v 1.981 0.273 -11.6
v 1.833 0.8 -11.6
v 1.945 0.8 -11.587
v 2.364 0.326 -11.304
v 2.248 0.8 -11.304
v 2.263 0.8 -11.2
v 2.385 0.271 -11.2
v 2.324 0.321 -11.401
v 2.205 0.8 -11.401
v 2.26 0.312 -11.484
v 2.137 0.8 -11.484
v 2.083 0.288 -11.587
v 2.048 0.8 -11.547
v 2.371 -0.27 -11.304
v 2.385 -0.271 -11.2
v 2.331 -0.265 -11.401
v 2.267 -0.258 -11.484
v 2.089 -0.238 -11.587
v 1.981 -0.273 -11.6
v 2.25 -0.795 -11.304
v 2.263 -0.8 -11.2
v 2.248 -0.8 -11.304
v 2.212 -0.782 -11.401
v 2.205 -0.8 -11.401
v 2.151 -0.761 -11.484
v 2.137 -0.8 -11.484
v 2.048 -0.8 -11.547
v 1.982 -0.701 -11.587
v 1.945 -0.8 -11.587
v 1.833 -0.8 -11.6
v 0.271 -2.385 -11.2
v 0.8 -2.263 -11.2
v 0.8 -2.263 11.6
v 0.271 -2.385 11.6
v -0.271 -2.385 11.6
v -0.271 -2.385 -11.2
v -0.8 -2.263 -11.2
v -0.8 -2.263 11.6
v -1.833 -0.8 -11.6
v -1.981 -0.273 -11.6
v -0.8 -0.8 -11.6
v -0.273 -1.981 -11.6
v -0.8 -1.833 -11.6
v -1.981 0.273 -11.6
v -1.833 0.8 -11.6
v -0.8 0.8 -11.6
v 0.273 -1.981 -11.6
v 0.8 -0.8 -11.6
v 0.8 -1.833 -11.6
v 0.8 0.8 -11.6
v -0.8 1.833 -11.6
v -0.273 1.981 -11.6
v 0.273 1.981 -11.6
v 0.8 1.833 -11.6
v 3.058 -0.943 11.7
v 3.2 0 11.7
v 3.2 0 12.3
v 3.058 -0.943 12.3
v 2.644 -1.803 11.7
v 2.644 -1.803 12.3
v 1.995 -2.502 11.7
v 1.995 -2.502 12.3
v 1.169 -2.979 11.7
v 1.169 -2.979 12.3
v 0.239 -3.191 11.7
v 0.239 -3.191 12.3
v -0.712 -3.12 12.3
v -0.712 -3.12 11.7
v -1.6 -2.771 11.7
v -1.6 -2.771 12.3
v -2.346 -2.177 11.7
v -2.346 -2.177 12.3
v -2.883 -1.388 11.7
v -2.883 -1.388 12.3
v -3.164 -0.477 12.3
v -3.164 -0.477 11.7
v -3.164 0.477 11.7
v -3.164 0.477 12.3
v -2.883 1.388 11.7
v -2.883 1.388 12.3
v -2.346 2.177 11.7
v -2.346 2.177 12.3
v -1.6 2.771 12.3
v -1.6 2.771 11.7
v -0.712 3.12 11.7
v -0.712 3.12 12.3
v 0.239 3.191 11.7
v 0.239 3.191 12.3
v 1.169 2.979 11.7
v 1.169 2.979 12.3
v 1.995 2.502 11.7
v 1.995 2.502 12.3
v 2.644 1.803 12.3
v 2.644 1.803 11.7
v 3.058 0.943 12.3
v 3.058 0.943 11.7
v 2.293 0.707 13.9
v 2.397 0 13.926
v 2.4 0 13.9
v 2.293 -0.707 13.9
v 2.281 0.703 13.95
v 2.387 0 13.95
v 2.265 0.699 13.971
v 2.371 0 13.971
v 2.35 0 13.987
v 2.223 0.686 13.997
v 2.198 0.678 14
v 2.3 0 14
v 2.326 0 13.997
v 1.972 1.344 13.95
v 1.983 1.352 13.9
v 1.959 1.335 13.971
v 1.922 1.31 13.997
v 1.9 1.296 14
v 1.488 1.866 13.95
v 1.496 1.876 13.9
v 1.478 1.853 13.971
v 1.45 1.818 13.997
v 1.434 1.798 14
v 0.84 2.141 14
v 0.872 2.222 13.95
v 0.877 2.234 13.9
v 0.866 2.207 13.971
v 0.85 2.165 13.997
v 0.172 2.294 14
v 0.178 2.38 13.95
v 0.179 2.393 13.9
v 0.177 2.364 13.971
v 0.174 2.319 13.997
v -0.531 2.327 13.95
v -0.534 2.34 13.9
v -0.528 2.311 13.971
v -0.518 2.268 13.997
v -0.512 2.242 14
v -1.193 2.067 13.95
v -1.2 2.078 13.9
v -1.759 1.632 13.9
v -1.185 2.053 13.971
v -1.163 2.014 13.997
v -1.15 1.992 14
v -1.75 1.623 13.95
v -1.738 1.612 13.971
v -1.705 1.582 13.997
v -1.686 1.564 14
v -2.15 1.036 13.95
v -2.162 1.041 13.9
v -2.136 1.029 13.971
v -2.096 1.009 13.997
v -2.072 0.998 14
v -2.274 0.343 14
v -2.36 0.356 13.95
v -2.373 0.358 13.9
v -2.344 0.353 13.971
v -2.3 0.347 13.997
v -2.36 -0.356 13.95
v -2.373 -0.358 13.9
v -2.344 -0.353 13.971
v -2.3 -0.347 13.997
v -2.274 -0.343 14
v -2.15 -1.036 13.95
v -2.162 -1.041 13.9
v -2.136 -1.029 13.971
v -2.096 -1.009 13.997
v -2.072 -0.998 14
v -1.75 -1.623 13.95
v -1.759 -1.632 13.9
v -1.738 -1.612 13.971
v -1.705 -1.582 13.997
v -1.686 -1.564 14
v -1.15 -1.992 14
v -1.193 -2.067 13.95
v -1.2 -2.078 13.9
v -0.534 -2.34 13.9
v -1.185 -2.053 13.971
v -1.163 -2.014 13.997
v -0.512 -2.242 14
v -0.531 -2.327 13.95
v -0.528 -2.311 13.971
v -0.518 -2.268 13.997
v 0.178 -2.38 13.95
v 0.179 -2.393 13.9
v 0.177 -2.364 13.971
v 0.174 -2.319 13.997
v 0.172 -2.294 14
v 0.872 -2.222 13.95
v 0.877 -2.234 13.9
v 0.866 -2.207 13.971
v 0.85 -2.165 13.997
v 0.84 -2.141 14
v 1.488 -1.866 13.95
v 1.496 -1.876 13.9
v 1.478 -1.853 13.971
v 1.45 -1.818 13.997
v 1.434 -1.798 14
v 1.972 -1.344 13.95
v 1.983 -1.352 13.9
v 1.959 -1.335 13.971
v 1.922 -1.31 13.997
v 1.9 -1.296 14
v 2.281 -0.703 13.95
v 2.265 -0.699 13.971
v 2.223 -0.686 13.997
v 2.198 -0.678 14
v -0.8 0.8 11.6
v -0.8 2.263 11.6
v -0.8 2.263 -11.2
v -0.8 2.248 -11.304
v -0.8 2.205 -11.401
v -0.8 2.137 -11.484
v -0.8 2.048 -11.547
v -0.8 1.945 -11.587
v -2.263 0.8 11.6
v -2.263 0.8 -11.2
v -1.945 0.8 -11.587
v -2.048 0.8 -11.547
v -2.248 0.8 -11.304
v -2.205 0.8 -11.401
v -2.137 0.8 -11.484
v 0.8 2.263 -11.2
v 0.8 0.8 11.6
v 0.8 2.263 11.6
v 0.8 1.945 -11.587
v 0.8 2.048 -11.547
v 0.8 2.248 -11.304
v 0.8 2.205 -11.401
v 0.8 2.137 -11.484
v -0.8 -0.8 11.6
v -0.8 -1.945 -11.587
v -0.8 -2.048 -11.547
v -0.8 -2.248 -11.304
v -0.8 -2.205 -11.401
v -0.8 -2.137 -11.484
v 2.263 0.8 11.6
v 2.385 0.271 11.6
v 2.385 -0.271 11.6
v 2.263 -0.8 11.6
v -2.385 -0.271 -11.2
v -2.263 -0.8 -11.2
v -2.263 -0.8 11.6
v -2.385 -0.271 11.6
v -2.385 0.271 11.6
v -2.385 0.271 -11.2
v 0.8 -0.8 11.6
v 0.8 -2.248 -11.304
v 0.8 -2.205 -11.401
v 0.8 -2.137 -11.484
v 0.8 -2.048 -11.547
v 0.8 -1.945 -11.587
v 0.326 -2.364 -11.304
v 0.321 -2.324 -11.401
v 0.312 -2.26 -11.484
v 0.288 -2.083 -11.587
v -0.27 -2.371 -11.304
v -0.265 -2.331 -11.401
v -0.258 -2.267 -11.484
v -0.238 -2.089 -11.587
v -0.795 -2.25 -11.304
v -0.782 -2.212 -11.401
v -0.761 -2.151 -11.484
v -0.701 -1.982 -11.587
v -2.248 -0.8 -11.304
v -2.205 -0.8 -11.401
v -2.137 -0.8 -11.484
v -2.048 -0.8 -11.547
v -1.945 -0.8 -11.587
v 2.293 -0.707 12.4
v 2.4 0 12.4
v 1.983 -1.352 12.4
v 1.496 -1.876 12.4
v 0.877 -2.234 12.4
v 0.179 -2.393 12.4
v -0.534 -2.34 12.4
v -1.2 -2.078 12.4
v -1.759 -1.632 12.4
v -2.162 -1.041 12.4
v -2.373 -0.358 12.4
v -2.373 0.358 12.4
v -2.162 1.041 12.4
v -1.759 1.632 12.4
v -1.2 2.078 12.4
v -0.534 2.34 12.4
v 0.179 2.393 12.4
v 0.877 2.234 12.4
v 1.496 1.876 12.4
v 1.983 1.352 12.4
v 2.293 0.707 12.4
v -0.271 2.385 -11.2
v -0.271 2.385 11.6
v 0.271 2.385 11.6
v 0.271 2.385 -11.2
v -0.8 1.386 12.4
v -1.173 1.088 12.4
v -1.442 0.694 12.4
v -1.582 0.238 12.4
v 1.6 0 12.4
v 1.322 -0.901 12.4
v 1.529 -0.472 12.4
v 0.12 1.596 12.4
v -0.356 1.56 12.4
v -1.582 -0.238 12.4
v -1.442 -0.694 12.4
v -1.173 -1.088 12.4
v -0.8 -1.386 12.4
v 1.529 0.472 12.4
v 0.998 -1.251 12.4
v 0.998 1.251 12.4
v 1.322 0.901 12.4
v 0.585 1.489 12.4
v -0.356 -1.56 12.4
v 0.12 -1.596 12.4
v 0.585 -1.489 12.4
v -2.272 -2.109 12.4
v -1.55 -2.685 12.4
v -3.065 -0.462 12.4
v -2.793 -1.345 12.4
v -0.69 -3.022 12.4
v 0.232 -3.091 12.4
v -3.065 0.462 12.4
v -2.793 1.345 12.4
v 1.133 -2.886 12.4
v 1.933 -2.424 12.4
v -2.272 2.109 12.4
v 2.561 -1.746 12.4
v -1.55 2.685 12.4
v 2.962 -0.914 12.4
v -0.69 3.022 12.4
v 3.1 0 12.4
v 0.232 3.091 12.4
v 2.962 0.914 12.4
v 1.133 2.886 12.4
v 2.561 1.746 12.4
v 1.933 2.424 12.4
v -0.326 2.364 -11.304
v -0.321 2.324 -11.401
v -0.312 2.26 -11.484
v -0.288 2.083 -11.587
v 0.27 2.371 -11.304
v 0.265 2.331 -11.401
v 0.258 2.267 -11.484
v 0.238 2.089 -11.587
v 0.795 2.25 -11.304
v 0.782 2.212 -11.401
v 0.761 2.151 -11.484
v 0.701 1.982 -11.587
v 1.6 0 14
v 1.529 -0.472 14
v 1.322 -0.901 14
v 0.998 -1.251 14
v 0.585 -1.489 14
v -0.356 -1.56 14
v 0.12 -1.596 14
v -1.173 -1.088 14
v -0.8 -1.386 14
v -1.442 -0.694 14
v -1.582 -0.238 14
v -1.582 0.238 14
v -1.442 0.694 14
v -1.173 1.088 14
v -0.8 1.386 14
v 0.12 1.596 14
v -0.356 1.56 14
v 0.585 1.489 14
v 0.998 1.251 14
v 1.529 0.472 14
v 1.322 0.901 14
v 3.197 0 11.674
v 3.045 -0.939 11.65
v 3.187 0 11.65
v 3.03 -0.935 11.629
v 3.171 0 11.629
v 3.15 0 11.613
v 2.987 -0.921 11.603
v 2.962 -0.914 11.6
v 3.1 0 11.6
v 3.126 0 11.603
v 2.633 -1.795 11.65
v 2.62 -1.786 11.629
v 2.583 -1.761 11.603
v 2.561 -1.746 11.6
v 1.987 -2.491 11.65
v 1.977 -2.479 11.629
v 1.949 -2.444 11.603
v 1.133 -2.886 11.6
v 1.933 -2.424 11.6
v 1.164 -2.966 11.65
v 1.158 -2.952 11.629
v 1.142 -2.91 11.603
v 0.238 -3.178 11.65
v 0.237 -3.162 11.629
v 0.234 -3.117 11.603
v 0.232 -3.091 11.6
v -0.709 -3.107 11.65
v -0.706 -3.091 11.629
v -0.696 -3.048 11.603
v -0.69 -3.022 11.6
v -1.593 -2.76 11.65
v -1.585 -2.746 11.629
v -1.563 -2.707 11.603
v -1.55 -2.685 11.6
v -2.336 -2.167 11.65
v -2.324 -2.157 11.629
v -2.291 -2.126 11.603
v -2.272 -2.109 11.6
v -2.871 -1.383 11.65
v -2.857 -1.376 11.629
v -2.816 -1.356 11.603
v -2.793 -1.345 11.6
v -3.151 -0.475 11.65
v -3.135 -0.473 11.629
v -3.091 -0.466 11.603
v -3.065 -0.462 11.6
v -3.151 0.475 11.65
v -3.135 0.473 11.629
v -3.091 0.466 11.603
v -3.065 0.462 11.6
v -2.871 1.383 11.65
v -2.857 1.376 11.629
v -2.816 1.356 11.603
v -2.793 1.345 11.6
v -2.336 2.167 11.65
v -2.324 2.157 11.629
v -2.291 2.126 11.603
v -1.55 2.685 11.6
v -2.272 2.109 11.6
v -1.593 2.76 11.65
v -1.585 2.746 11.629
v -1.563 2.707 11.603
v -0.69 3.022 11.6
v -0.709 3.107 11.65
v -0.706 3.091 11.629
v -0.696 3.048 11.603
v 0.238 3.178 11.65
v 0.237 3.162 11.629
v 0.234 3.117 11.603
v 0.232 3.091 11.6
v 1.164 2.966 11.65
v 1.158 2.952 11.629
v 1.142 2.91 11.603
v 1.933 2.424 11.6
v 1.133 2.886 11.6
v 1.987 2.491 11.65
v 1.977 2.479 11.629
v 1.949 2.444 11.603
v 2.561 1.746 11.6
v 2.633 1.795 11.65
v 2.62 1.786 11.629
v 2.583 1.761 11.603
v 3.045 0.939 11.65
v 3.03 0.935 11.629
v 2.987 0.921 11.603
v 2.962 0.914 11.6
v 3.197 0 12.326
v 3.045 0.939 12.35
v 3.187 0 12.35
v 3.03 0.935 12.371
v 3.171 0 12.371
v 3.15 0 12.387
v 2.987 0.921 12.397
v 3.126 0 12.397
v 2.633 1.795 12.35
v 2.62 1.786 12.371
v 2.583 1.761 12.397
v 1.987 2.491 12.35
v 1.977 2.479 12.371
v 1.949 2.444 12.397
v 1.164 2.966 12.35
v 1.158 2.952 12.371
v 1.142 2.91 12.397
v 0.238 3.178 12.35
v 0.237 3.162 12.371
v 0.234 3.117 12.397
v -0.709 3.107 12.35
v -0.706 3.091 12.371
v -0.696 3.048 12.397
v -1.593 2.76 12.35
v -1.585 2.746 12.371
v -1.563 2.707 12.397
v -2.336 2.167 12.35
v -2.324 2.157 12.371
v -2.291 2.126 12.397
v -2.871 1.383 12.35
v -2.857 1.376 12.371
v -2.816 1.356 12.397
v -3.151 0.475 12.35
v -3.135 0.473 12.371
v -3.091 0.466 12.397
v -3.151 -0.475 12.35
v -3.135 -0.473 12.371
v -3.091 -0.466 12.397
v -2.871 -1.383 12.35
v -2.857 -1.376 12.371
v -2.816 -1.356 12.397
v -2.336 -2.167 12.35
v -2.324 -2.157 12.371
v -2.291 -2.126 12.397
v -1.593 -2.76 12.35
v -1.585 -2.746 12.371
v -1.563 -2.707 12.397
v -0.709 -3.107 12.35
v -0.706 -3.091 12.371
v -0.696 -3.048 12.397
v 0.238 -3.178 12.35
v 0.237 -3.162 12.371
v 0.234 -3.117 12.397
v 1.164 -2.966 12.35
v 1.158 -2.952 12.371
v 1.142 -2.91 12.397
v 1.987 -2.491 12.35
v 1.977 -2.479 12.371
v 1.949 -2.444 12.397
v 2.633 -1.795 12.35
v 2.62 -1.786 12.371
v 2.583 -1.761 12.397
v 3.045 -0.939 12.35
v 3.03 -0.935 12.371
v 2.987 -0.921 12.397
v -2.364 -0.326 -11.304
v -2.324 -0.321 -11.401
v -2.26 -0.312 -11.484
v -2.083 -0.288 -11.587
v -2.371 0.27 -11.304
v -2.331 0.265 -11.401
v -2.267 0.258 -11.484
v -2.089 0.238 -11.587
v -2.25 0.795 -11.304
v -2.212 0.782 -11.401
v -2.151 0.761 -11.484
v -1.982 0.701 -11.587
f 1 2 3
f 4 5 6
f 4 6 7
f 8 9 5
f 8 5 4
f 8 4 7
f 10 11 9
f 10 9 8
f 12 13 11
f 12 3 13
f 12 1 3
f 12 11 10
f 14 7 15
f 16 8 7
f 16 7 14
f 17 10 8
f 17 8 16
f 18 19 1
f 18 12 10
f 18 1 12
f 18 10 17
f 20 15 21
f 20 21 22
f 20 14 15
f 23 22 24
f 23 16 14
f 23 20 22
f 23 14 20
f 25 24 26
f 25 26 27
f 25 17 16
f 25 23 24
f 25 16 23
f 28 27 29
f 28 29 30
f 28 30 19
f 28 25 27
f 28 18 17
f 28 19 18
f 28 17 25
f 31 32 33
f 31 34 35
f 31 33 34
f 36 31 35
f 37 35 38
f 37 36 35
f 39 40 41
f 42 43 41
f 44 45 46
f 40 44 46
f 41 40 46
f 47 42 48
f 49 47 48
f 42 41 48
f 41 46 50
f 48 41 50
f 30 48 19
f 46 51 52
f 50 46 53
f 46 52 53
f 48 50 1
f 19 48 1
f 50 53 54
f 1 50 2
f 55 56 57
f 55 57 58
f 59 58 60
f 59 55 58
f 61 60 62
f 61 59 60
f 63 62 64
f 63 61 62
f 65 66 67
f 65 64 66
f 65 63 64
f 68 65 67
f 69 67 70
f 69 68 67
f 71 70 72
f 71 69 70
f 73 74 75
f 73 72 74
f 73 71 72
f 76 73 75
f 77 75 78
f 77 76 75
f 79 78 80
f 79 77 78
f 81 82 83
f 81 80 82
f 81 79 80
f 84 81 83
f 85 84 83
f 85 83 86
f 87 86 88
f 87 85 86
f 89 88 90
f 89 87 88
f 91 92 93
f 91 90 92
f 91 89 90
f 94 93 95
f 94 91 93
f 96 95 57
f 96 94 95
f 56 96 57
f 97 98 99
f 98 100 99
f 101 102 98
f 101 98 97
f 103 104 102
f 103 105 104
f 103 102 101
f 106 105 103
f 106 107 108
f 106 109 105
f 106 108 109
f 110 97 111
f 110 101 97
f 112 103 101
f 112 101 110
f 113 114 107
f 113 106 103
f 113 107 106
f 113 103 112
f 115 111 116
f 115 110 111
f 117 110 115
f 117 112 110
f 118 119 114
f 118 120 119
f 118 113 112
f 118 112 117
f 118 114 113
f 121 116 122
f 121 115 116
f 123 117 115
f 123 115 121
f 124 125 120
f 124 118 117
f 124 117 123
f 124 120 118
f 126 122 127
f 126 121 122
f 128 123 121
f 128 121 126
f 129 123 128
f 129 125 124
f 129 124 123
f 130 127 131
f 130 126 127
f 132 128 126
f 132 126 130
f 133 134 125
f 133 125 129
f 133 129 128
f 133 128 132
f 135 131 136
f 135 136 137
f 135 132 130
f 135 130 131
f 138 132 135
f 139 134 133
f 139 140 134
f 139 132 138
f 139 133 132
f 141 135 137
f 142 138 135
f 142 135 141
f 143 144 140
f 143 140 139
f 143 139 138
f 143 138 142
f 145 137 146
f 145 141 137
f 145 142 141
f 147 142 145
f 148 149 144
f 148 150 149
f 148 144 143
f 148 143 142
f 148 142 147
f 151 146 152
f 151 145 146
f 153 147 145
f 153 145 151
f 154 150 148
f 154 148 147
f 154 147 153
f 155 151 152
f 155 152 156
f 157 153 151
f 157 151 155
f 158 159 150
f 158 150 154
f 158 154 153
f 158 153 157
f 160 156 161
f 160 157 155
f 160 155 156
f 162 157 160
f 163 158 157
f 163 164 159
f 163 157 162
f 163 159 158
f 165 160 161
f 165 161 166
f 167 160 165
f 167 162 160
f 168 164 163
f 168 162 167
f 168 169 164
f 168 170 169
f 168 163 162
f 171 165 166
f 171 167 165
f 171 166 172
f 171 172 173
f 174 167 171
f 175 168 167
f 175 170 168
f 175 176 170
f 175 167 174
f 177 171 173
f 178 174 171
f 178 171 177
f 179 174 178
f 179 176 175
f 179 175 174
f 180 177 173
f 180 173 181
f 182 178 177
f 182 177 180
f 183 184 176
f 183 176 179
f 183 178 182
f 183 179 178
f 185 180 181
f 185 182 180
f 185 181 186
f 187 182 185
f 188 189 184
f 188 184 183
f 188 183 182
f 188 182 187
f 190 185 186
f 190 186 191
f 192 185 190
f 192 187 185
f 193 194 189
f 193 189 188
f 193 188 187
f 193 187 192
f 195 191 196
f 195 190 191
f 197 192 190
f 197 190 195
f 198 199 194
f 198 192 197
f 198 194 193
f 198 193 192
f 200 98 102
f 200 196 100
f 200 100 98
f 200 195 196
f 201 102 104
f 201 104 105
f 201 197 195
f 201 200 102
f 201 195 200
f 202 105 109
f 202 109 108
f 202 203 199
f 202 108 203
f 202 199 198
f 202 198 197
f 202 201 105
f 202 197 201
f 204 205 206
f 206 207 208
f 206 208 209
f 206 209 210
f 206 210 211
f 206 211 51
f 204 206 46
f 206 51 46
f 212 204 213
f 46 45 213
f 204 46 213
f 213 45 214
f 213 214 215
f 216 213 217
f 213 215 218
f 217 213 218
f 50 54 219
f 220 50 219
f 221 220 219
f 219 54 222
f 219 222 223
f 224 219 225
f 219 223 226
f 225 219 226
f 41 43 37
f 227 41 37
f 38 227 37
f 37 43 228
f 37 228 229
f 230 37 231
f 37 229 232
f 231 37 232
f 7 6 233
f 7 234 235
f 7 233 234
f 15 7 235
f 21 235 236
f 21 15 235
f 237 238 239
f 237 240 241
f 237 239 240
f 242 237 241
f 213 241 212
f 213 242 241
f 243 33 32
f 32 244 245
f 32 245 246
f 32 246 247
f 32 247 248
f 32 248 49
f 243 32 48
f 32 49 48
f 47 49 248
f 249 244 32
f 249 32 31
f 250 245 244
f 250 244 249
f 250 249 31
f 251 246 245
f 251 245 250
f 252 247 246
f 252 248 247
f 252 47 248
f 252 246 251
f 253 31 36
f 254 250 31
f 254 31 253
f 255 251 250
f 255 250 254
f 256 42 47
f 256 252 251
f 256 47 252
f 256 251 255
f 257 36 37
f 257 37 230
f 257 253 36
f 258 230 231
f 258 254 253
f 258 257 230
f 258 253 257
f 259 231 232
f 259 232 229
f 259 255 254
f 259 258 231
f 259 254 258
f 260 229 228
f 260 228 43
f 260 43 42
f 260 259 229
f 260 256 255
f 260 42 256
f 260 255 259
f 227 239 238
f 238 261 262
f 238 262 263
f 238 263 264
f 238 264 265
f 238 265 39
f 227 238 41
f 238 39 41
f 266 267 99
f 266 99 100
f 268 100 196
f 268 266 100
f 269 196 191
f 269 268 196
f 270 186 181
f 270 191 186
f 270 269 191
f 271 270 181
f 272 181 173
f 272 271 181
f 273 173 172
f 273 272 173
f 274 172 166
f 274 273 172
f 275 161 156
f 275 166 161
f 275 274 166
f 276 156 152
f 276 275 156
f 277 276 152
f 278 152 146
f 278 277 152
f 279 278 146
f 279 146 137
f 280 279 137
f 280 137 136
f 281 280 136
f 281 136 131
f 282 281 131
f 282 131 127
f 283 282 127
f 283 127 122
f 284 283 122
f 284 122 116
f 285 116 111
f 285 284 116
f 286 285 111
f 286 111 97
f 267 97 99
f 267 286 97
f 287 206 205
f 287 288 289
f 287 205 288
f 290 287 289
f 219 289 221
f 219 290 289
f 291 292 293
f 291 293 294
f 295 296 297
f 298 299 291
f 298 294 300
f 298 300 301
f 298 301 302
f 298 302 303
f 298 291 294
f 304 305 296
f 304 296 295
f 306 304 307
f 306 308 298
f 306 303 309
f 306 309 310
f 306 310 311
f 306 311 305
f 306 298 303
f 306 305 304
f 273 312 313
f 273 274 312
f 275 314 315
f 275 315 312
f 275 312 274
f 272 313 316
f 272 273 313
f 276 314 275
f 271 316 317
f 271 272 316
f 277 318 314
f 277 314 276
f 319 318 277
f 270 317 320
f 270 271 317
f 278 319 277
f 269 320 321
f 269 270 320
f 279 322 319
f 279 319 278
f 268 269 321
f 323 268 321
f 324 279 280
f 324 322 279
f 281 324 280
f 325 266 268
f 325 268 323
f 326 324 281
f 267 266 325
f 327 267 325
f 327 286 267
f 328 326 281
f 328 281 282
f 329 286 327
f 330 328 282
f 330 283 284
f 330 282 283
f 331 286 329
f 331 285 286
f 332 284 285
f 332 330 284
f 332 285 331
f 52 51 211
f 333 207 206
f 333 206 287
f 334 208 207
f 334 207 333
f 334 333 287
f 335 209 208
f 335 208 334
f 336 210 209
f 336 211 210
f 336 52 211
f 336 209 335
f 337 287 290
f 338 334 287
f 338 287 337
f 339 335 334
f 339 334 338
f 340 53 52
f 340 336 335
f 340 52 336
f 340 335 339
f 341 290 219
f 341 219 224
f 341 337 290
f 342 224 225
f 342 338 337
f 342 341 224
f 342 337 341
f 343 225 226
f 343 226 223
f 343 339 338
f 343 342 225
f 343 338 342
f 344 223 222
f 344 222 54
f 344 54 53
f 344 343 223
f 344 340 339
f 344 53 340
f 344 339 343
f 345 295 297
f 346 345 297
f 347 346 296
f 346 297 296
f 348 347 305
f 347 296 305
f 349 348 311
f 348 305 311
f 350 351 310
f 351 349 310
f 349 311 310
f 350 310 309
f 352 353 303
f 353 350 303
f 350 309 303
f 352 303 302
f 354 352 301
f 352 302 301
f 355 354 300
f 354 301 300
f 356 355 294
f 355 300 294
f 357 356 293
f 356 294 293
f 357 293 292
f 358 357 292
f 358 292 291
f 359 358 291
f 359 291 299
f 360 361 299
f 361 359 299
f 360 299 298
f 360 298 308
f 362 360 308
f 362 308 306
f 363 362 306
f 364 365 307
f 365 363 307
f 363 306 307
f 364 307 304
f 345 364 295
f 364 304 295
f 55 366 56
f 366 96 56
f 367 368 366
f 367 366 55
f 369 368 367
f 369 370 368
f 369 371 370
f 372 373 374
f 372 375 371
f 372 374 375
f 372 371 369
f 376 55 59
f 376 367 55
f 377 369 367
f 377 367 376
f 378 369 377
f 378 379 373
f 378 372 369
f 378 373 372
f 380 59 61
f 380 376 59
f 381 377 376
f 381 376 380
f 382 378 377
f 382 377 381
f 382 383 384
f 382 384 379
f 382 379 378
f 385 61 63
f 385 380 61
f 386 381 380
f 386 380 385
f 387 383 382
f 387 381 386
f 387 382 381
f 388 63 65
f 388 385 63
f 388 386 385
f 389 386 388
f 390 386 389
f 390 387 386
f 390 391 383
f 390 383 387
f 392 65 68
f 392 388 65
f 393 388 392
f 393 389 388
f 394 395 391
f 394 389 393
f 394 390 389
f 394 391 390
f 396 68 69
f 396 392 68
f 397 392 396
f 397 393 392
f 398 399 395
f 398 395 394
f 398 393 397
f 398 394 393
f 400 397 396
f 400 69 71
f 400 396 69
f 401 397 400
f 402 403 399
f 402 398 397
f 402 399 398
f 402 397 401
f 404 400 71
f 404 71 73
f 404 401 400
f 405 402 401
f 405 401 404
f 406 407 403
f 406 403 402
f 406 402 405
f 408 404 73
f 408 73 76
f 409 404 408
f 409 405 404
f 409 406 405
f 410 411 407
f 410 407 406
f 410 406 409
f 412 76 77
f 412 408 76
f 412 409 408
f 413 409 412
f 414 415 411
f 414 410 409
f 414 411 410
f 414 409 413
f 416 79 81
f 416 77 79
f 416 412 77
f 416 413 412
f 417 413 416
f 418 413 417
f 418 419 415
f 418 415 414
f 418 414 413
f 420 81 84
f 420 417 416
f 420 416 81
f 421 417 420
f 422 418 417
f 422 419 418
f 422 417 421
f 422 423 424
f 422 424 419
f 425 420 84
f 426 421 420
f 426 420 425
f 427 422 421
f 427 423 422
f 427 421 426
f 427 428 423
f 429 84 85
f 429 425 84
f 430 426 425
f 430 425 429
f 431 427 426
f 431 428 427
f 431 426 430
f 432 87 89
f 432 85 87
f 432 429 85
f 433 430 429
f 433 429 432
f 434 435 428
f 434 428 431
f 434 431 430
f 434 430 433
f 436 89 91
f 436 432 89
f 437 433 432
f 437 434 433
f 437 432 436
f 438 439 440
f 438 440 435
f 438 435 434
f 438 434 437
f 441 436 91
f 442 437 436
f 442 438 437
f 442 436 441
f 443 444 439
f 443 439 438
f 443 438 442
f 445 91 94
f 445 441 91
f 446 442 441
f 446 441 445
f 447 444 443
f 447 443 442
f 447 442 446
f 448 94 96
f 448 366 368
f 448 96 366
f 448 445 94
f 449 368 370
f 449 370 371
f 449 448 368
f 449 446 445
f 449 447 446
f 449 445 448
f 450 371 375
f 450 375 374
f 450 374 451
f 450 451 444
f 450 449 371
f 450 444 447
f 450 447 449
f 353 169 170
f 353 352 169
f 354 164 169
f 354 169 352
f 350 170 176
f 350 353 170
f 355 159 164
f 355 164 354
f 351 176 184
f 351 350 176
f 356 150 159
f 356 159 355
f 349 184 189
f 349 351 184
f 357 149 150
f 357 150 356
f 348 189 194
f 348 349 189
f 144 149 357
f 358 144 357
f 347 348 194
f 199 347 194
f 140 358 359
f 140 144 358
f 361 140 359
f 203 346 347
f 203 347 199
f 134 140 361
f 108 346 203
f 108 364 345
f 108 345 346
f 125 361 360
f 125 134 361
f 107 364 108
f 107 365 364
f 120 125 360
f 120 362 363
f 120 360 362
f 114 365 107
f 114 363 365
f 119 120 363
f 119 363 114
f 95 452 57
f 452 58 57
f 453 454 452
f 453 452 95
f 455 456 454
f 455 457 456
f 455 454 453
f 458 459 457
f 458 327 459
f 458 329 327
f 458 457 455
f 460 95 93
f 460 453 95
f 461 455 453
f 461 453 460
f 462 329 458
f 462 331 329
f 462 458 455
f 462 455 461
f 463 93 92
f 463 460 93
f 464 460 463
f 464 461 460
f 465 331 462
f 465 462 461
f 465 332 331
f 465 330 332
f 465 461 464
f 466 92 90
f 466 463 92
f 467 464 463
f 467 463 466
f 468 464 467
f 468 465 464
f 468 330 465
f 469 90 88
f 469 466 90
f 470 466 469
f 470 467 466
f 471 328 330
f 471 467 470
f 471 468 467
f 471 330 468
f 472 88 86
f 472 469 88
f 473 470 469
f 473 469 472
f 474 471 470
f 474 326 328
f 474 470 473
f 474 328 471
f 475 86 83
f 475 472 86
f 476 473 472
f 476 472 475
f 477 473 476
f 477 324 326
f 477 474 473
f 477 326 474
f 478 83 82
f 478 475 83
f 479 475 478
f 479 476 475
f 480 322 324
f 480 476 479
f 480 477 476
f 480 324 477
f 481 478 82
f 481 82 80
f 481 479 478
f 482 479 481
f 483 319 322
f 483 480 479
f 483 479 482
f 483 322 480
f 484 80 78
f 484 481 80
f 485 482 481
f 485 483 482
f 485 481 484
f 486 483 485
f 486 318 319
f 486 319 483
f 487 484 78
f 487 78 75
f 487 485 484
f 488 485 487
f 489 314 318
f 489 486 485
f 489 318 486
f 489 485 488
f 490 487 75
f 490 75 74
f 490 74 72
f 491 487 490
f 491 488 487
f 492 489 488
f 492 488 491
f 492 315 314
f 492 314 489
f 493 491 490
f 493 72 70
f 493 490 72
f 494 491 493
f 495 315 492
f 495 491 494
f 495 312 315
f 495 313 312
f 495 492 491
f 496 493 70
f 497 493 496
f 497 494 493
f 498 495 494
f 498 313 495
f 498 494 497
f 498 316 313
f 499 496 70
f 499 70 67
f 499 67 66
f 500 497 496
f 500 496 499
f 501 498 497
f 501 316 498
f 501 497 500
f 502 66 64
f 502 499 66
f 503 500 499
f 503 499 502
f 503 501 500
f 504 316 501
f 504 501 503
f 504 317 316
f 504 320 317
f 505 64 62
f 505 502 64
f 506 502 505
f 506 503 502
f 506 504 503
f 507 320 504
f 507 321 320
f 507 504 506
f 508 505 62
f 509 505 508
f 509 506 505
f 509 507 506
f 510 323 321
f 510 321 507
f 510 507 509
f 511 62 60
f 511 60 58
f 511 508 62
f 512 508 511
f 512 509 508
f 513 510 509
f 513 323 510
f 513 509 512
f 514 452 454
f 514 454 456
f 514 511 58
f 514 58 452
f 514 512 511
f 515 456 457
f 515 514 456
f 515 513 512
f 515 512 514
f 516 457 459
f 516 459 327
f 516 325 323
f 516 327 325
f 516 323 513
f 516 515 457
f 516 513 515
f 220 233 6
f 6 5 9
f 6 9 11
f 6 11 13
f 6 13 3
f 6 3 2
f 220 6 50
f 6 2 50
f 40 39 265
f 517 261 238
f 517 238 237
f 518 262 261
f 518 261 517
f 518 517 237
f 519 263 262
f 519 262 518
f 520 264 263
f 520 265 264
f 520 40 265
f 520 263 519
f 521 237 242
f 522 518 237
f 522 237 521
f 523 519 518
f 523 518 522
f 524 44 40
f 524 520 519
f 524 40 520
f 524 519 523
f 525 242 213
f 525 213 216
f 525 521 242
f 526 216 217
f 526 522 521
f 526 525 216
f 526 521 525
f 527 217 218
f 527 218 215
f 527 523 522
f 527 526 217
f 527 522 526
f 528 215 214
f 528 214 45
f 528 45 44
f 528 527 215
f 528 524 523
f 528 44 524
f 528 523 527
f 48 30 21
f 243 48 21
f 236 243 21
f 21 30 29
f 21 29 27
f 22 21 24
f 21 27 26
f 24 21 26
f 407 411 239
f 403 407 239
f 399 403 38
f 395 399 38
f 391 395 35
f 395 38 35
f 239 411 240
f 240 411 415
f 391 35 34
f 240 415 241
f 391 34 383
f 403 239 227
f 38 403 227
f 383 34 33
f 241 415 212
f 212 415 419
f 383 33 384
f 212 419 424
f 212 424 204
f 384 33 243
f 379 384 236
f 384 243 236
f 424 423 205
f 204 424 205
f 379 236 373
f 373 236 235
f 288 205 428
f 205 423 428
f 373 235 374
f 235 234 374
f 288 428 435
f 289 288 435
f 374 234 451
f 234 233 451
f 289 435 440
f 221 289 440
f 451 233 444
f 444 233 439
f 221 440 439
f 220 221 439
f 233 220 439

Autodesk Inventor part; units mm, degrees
ref_plane "YZ Plane" through (0, 0, 0) normal (1, 0, 0) x (0, 1, 0)
ref_plane "XZ Plane" through (0, 0, 0) normal (0, 1, 0) x (-1, 0, 0)
ref_plane "XY Plane" through (0, 0, 0) normal (0, 0, 1) x (1, 0, 0)
sketch "Sketch1" plane through (0, 0, 0) normal (0, 0, 1) x (1, 0, 0)
  circle A0 centre (0, 0) radius 2.4 construction
  line L0 (-0.8, 2.2627) -> (-0.8, 0.8)
  line L1 (-0.8, 0.8) -> (-2.2627, 0.8)
  line L2 (-2.2627, -0.8) -> (-0.8, -0.8)
  line L3 (-0.8, -0.8) -> (-0.8, -2.2627)
  line L4 (0.8, -2.2627) -> (0.8, -0.8)
  line L5 (0.8, -0.8) -> (2.2627, -0.8)
  line L6 (2.2627, 0.8) -> (0.8, 0.8)
  line L7 (0.8, 0.8) -> (0.8, 2.2627)
  arc A1 (0.8, 2.2627) -> (-0.8, 2.2627) centre (0, 0) ccw
  arc A2 (-2.2627, 0.8) -> (-2.2627, -0.8) centre (0, 0) ccw
  arc A3 (-0.8, -2.2627) -> (0.8, -2.2627) centre (0, 0) ccw
  arc A4 (2.2627, -0.8) -> (2.2627, 0.8) centre (0, 0) ccw
  dimension "d0" = 4.8
  dimension "d1" = 1.6
extrude "Extrusion1" add sketch "Sketch1" along normal mid plane 23.2
sketch "Sketch2" plane through (0, 0, 11.6) normal (0, 0, 1) x (1, 0, 0)
  arc A0 (0.8, 2.2627) -> (-0.8, 2.2627) centre (0, 0) ccw projected
  circle A1 centre (0, 0) radius 3.2
  dimension "d7" = 6.4
extrude "Extrusion2" add sketch "Sketch2" along normal blind 0.8
sketch "Sketch3" plane through (0, 0, 12.4) normal (0, 0, 1) x (1, 0, 0)
  circle A0 centre (0, 0) radius 3.2 projected
  circle A1 centre (0, 0) radius 2.4
  circle A2 centre (0, 0) radius 1.6
  dimension "d10" = 4.8
  dimension "d11" = 3.2
extrude "Extrusion3" add sketch "Sketch3" along normal blind 1.6 contours A1
sketch3d "Sketch4"
feature "LEGO_SM:1" [suppressed]
fillet "Fillet1" radius 0.4 4 edges at (2.4, 0, -11.6) (0, 2.4, -11.6) (-2.4, 0, -11.6) (0, -2.4, -11.6)
fillet "Fillet1" radius 0.1 3 edges at (-2.4, 0, 14) (-3.2, 0, 12.4) (-3.2, 0, 11.6)
equation "\"d0\" = kd"
equation "\"d1\" = axlet"
equation "\"d2\" = 3 * lu - tsl"
equation "\"d7\" = tsd"
equation "\"d8\" = tsl"
equation "\"d10\" = kd"
equation "\"d11\" = rd"
equation "\"d12\" = knobh"
equation "\"d4\" = tf"
equation "\"d14\" = lf"
equation "\"lf\" = 0.1"
equation "\"tf\" = 0.4"
equation "\"kd\" = 4.8"
equation "\"axlet\" = 1.6"
equation "\"lu\" = 8"
equation "\"tsl\" = 0.8"
equation "\"tsd\" = 6.4"
equation "\"rd\" = 3.2"
equation "\"knobh\" = 1.6"
properties part number "6587-DkTan" material "ABS Plastic"
